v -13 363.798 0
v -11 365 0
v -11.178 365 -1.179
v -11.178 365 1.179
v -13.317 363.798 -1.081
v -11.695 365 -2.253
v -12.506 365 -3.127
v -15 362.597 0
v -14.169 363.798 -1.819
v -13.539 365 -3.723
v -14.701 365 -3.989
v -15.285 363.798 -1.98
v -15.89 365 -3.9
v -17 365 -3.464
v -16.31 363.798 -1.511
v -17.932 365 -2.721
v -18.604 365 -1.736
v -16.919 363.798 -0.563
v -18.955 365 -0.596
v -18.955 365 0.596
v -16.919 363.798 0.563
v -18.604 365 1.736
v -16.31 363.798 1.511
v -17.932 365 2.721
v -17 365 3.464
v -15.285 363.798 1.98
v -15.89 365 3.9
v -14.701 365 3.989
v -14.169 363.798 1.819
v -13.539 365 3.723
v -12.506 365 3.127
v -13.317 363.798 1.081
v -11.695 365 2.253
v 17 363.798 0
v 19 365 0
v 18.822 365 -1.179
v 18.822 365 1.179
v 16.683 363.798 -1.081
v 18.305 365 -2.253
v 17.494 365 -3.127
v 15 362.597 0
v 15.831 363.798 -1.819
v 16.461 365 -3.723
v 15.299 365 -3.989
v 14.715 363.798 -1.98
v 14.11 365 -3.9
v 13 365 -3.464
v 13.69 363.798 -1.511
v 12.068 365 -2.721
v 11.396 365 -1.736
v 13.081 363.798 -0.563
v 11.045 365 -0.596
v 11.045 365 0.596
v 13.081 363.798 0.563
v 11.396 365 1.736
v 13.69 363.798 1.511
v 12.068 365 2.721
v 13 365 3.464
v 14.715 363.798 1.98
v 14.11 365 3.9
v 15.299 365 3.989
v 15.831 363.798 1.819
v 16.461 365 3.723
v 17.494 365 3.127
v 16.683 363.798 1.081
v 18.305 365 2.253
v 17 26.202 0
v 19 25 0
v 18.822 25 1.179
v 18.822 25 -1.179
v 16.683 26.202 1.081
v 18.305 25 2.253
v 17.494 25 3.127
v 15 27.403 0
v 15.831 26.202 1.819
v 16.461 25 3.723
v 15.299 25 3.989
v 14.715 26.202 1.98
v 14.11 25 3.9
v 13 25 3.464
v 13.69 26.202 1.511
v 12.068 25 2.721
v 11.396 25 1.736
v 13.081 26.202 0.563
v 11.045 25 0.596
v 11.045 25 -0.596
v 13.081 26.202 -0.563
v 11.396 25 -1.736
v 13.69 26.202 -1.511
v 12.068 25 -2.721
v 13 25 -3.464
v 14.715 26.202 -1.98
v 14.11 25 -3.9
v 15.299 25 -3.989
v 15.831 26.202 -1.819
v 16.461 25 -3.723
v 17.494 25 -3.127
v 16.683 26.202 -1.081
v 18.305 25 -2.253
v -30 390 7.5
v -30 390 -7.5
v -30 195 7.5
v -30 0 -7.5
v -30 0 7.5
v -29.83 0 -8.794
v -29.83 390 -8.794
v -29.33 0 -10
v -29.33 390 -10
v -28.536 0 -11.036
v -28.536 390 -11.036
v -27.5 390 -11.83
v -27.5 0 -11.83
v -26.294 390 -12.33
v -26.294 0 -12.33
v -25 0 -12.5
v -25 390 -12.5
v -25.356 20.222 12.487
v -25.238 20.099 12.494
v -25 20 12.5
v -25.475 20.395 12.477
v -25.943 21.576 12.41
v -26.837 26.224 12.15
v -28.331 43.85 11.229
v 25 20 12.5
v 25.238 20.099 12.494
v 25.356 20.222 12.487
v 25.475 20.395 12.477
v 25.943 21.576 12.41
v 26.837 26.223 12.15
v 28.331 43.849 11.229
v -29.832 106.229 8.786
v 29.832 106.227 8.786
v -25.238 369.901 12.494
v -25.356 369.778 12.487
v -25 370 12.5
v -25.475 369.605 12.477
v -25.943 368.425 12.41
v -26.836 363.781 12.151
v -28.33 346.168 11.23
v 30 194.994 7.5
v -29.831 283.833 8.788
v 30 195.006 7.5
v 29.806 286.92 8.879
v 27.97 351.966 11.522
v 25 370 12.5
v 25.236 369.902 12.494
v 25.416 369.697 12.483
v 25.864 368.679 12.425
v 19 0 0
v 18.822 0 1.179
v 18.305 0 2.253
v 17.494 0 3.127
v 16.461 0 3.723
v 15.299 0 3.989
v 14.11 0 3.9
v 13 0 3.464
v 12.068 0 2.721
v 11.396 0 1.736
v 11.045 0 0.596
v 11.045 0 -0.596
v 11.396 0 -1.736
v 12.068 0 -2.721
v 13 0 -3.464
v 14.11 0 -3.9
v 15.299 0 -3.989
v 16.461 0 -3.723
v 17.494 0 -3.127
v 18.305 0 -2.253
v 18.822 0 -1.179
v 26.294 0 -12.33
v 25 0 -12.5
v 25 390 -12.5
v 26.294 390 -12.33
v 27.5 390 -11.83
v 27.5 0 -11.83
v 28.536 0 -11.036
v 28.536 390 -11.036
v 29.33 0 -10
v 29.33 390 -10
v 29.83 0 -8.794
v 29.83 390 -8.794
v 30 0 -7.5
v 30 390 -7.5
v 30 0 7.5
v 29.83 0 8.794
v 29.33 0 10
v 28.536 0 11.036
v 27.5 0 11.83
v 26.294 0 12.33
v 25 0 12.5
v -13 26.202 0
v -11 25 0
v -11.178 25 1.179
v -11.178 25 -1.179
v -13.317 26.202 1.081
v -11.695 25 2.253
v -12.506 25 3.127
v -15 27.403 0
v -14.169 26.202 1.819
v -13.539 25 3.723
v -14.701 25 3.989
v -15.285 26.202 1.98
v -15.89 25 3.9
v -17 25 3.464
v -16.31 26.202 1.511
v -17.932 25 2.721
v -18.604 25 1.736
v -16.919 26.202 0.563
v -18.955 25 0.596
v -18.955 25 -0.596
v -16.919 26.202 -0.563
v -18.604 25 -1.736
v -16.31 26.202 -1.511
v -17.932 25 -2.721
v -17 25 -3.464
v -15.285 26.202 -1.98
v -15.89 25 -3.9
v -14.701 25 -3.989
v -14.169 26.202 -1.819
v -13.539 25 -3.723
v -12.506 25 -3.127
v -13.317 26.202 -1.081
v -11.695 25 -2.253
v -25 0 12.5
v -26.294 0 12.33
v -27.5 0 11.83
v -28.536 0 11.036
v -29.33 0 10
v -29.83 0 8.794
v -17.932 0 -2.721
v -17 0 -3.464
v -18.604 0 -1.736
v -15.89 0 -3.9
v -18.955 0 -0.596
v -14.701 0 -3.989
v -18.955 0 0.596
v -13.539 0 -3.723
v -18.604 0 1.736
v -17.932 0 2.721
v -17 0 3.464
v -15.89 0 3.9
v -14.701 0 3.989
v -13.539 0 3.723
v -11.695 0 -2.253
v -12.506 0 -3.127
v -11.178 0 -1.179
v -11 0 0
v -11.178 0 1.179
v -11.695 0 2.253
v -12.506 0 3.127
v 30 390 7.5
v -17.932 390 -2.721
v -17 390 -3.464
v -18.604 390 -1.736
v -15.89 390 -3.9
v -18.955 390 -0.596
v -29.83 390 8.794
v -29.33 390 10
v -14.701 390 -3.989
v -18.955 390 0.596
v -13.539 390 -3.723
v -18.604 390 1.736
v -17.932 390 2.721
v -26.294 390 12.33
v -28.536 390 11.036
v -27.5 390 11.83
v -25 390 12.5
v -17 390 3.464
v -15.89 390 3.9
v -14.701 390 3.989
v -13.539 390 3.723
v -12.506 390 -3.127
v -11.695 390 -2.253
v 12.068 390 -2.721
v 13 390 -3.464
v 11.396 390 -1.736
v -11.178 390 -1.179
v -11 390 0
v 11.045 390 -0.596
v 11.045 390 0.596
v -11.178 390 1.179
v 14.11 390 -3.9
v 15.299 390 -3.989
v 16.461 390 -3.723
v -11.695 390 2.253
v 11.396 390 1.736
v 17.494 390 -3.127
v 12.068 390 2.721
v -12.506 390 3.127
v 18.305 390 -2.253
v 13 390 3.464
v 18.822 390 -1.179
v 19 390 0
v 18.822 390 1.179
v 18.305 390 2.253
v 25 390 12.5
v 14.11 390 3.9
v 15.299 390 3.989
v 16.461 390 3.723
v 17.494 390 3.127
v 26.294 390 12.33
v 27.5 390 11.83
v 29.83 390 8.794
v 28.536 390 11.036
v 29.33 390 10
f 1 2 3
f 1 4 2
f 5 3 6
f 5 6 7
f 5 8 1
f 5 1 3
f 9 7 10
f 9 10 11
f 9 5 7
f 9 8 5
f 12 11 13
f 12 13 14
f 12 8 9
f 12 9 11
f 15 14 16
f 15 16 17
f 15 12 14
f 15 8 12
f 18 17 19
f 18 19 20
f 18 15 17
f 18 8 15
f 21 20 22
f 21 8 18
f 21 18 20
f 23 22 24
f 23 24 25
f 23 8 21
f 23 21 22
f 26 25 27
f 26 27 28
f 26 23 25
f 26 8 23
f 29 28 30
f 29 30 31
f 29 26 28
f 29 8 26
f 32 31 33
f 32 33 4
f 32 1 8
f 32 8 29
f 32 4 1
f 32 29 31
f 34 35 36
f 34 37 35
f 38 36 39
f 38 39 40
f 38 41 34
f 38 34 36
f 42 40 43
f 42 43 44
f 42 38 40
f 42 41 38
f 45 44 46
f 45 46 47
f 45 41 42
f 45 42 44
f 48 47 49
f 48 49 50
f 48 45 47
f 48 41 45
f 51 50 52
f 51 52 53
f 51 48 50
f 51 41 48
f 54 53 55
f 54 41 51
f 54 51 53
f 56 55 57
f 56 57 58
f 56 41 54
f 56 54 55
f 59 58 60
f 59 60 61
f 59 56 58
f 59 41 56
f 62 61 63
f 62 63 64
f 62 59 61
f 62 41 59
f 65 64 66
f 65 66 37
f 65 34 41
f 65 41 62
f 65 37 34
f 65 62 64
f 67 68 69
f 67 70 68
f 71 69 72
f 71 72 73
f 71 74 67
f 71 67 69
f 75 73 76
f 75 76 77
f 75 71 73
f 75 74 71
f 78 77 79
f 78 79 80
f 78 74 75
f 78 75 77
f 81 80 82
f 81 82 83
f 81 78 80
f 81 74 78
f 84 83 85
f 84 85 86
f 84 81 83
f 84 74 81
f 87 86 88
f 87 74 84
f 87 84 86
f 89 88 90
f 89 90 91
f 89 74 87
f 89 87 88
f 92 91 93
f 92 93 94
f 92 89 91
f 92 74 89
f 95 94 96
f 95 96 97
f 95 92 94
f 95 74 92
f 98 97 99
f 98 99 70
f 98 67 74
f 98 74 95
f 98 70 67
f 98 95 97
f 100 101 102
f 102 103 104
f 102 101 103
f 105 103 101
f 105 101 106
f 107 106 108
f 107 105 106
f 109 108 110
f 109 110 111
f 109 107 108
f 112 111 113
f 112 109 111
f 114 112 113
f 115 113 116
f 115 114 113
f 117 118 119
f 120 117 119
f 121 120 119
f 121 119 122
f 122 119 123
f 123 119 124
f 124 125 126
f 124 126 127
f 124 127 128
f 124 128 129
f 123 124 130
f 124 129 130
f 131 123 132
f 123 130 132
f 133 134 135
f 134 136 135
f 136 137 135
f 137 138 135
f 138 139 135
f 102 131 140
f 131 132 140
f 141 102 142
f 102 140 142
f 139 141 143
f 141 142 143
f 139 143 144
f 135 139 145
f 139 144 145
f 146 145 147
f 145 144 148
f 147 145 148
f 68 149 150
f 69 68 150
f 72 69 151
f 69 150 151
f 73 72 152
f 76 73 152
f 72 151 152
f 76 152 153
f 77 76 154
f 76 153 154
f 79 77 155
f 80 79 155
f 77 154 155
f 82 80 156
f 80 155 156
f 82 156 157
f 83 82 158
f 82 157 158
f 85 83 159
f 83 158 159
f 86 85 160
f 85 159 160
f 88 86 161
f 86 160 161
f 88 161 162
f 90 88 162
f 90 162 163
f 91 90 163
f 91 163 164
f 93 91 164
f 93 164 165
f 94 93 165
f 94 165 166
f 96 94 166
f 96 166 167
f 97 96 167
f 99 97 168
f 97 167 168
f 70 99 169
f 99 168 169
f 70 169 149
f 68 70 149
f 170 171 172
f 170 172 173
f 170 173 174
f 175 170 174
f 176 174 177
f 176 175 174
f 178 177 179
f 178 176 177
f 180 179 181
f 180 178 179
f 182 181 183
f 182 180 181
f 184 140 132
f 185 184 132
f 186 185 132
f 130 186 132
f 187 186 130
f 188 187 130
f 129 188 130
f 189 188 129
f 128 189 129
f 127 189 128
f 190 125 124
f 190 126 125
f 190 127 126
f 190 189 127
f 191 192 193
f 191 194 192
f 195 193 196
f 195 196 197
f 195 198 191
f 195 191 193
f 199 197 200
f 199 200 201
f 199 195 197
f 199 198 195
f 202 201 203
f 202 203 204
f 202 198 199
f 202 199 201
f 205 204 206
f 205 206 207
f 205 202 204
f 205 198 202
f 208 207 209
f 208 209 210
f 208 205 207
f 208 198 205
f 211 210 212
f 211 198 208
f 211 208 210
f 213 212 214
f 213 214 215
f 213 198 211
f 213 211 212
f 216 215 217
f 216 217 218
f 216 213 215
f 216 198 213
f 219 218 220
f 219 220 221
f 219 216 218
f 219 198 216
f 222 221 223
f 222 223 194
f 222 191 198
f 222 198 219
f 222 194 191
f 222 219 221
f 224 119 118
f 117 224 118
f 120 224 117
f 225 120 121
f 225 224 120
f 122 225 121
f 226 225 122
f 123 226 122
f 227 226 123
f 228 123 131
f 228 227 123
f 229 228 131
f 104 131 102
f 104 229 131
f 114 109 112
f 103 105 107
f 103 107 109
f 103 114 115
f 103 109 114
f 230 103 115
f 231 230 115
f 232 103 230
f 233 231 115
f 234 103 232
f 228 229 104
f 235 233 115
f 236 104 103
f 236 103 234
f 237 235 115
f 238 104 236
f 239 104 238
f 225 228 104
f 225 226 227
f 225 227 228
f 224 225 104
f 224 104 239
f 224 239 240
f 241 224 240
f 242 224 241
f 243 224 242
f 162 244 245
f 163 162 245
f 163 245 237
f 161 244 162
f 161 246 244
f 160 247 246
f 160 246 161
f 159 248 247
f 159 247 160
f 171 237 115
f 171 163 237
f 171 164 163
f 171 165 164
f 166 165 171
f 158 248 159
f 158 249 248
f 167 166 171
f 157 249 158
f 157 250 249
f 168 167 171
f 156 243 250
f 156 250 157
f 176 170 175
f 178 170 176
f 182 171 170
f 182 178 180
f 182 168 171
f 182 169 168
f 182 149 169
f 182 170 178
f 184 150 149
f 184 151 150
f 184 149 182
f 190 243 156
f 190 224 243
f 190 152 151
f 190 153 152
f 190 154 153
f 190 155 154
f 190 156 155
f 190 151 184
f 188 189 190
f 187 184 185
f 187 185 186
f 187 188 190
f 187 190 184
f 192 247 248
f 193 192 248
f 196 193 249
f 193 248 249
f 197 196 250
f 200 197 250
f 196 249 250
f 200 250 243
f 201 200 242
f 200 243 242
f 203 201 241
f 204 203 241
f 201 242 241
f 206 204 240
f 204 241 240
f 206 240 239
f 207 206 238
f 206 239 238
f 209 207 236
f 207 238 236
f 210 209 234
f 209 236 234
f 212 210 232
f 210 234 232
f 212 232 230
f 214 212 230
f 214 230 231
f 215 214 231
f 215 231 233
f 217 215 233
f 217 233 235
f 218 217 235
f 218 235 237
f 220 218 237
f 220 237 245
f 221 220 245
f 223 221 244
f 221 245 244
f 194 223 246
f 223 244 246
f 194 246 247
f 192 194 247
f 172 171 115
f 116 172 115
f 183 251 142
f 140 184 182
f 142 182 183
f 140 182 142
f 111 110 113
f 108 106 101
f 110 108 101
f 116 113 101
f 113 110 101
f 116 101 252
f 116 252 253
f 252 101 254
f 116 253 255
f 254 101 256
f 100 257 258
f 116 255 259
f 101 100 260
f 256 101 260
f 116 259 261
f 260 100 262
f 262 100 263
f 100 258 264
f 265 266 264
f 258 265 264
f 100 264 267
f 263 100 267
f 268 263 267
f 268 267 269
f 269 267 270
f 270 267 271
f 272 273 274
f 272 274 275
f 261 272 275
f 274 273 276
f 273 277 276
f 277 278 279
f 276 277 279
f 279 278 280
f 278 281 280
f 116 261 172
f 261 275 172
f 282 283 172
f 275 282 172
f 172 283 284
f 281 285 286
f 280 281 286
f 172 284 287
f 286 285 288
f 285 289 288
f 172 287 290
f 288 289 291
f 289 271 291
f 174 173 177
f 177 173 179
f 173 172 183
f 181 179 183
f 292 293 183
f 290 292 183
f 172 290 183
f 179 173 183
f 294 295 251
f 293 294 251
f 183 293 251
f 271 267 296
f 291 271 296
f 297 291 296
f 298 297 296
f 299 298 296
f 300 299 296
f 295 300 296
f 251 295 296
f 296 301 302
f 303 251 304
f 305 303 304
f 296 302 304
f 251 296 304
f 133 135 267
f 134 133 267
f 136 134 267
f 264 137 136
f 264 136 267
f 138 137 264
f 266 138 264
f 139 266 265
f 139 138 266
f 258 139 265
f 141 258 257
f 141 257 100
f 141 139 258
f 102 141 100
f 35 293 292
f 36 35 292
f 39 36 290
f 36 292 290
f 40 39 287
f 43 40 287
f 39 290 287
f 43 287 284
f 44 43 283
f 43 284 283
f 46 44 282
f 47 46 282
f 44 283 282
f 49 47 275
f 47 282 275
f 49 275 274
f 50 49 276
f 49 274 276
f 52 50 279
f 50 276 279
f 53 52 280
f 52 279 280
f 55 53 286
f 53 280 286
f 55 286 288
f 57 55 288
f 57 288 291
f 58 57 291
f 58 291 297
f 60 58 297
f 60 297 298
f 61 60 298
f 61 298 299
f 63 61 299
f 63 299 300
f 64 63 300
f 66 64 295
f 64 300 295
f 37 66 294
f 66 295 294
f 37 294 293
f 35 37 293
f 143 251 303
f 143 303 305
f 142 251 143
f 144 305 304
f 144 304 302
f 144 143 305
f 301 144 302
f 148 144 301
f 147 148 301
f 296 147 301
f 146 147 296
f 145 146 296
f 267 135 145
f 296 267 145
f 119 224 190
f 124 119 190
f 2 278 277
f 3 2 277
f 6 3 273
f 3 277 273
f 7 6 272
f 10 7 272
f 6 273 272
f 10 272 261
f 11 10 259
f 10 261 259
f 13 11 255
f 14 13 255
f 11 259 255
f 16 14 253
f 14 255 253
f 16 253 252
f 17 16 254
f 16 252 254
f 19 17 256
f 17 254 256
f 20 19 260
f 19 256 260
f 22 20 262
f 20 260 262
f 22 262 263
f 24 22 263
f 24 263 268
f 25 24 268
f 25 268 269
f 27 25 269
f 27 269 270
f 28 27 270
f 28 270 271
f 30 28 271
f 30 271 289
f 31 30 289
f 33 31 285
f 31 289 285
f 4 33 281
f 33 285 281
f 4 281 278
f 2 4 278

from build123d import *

# Parameters (mm, degrees)
PAD001_DEPTH      = 390
SKETCH003_R       = 4
HOLE_DEPTH        = 25
HOLE_TIPS_R       = 4
SKETCH004_R       = 4
HOLE001_DEPTH     = 25
HOLE001_TIPS_R    = 4
POCKET_DEPTH      = 64
POCKET_DEPTH_BACK = 5


with BuildPart() as part:
    # Sketch002 → Pad001 (new body)
    with BuildSketch(Plane.XZ):
        with BuildLine():
            ThreePointArc((25, -12.5), (28.535534, -11.035534), (30, -7.5))
            Line((30, 7.5), (30, -7.5))
            ThreePointArc((30, 7.5), (28.535534, 11.035534), (25, 12.5))
            Line((-25, 12.5), (25, 12.5))
            ThreePointArc((-25, 12.5), (-28.535534, 11.035534), (-30, 7.5))
            Line((-30, -7.5), (-30, 7.5))
            ThreePointArc((-30, -7.5), (-28.535534, -11.035534), (-25, -12.5))
            Line((25, -12.5), (-25, -12.5))
        make_face()
    extrude(amount=-PAD001_DEPTH)

    # Sketch003 (on Face9 of Pad001) → Hole (cut)
    with BuildSketch(Plane.XZ):
        with Locations((15, 0)):
            Circle(SKETCH003_R)
        with Locations((-15, 0)):
            Circle(SKETCH003_R)
    extrude(amount=-HOLE_DEPTH, mode=Mode.SUBTRACT)

    # Hole tips → Hole tip 1 section 0
    with BuildSketch(Plane.XZ.offset(-25), mode=Mode.PRIVATE) as hole_tip_1_s0:
        with Locations((15, 0)):
            Circle(HOLE_TIPS_R)
    loft([hole_tip_1_s0.sketch, Vertex(15, 27.403442, 0)], mode=Mode.SUBTRACT)

    # Hole tips → Hole tip 2 section 0
    with BuildSketch(Plane.XZ.offset(-25), mode=Mode.PRIVATE) as hole_tip_2_s0:
        with Locations((-15, 0)):
            Circle(HOLE_TIPS_R)
    loft([hole_tip_2_s0.sketch, Vertex(-15, 27.403442, 0)], mode=Mode.SUBTRACT)

    # Sketch004 (on Face5 of Hole) → Hole001 (cut)
    with BuildSketch(Plane(origin=(0, 390, 0), x_dir=(1, 0, 0), z_dir=(0, 1, 0))):
        with Locations((-15, 0)):
            Circle(SKETCH004_R)
        with Locations((15, 0)):
            Circle(SKETCH004_R)
    extrude(amount=-HOLE001_DEPTH, mode=Mode.SUBTRACT)

    # Hole001 tips → Hole001 tip 1 section 0
    with BuildSketch(Plane(origin=(0, 365, 0), x_dir=(1, 0, 0), z_dir=(0, 1, 0)), mode=Mode.PRIVATE) as hole001_tip_1_s0:
        with Locations((-15, 0)):
            Circle(HOLE001_TIPS_R)
    loft([hole001_tip_1_s0.sketch, Vertex(-15, 362.596558, 0)], mode=Mode.SUBTRACT)

    # Hole001 tips → Hole001 tip 2 section 0
    with BuildSketch(Plane(origin=(0, 365, 0), x_dir=(1, 0, 0), z_dir=(0, 1, 0)), mode=Mode.PRIVATE) as hole001_tip_2_s0:
        with Locations((15, 0)):
            Circle(HOLE001_TIPS_R)
    loft([hole001_tip_2_s0.sketch, Vertex(15, 362.596558, 0)], mode=Mode.SUBTRACT)

    # Sketch005 (on Face3 of Hole001) → Pocket (cut, two sides)
    with BuildSketch(Plane(origin=(30, 0, 0), x_dir=(0, 0, 1), z_dir=(1, 0, 0))) as pocket_sk:
        with BuildLine():
            ThreePointArc((12.5, -20), (7.5, -195), (12.5, -370))
            Line((12.5, -20), (12.5, -370))
        make_face()
    extrude(amount=-POCKET_DEPTH, mode=Mode.SUBTRACT)
    extrude(pocket_sk.sketch, amount=POCKET_DEPTH_BACK, mode=Mode.SUBTRACT)


solid = part.part
